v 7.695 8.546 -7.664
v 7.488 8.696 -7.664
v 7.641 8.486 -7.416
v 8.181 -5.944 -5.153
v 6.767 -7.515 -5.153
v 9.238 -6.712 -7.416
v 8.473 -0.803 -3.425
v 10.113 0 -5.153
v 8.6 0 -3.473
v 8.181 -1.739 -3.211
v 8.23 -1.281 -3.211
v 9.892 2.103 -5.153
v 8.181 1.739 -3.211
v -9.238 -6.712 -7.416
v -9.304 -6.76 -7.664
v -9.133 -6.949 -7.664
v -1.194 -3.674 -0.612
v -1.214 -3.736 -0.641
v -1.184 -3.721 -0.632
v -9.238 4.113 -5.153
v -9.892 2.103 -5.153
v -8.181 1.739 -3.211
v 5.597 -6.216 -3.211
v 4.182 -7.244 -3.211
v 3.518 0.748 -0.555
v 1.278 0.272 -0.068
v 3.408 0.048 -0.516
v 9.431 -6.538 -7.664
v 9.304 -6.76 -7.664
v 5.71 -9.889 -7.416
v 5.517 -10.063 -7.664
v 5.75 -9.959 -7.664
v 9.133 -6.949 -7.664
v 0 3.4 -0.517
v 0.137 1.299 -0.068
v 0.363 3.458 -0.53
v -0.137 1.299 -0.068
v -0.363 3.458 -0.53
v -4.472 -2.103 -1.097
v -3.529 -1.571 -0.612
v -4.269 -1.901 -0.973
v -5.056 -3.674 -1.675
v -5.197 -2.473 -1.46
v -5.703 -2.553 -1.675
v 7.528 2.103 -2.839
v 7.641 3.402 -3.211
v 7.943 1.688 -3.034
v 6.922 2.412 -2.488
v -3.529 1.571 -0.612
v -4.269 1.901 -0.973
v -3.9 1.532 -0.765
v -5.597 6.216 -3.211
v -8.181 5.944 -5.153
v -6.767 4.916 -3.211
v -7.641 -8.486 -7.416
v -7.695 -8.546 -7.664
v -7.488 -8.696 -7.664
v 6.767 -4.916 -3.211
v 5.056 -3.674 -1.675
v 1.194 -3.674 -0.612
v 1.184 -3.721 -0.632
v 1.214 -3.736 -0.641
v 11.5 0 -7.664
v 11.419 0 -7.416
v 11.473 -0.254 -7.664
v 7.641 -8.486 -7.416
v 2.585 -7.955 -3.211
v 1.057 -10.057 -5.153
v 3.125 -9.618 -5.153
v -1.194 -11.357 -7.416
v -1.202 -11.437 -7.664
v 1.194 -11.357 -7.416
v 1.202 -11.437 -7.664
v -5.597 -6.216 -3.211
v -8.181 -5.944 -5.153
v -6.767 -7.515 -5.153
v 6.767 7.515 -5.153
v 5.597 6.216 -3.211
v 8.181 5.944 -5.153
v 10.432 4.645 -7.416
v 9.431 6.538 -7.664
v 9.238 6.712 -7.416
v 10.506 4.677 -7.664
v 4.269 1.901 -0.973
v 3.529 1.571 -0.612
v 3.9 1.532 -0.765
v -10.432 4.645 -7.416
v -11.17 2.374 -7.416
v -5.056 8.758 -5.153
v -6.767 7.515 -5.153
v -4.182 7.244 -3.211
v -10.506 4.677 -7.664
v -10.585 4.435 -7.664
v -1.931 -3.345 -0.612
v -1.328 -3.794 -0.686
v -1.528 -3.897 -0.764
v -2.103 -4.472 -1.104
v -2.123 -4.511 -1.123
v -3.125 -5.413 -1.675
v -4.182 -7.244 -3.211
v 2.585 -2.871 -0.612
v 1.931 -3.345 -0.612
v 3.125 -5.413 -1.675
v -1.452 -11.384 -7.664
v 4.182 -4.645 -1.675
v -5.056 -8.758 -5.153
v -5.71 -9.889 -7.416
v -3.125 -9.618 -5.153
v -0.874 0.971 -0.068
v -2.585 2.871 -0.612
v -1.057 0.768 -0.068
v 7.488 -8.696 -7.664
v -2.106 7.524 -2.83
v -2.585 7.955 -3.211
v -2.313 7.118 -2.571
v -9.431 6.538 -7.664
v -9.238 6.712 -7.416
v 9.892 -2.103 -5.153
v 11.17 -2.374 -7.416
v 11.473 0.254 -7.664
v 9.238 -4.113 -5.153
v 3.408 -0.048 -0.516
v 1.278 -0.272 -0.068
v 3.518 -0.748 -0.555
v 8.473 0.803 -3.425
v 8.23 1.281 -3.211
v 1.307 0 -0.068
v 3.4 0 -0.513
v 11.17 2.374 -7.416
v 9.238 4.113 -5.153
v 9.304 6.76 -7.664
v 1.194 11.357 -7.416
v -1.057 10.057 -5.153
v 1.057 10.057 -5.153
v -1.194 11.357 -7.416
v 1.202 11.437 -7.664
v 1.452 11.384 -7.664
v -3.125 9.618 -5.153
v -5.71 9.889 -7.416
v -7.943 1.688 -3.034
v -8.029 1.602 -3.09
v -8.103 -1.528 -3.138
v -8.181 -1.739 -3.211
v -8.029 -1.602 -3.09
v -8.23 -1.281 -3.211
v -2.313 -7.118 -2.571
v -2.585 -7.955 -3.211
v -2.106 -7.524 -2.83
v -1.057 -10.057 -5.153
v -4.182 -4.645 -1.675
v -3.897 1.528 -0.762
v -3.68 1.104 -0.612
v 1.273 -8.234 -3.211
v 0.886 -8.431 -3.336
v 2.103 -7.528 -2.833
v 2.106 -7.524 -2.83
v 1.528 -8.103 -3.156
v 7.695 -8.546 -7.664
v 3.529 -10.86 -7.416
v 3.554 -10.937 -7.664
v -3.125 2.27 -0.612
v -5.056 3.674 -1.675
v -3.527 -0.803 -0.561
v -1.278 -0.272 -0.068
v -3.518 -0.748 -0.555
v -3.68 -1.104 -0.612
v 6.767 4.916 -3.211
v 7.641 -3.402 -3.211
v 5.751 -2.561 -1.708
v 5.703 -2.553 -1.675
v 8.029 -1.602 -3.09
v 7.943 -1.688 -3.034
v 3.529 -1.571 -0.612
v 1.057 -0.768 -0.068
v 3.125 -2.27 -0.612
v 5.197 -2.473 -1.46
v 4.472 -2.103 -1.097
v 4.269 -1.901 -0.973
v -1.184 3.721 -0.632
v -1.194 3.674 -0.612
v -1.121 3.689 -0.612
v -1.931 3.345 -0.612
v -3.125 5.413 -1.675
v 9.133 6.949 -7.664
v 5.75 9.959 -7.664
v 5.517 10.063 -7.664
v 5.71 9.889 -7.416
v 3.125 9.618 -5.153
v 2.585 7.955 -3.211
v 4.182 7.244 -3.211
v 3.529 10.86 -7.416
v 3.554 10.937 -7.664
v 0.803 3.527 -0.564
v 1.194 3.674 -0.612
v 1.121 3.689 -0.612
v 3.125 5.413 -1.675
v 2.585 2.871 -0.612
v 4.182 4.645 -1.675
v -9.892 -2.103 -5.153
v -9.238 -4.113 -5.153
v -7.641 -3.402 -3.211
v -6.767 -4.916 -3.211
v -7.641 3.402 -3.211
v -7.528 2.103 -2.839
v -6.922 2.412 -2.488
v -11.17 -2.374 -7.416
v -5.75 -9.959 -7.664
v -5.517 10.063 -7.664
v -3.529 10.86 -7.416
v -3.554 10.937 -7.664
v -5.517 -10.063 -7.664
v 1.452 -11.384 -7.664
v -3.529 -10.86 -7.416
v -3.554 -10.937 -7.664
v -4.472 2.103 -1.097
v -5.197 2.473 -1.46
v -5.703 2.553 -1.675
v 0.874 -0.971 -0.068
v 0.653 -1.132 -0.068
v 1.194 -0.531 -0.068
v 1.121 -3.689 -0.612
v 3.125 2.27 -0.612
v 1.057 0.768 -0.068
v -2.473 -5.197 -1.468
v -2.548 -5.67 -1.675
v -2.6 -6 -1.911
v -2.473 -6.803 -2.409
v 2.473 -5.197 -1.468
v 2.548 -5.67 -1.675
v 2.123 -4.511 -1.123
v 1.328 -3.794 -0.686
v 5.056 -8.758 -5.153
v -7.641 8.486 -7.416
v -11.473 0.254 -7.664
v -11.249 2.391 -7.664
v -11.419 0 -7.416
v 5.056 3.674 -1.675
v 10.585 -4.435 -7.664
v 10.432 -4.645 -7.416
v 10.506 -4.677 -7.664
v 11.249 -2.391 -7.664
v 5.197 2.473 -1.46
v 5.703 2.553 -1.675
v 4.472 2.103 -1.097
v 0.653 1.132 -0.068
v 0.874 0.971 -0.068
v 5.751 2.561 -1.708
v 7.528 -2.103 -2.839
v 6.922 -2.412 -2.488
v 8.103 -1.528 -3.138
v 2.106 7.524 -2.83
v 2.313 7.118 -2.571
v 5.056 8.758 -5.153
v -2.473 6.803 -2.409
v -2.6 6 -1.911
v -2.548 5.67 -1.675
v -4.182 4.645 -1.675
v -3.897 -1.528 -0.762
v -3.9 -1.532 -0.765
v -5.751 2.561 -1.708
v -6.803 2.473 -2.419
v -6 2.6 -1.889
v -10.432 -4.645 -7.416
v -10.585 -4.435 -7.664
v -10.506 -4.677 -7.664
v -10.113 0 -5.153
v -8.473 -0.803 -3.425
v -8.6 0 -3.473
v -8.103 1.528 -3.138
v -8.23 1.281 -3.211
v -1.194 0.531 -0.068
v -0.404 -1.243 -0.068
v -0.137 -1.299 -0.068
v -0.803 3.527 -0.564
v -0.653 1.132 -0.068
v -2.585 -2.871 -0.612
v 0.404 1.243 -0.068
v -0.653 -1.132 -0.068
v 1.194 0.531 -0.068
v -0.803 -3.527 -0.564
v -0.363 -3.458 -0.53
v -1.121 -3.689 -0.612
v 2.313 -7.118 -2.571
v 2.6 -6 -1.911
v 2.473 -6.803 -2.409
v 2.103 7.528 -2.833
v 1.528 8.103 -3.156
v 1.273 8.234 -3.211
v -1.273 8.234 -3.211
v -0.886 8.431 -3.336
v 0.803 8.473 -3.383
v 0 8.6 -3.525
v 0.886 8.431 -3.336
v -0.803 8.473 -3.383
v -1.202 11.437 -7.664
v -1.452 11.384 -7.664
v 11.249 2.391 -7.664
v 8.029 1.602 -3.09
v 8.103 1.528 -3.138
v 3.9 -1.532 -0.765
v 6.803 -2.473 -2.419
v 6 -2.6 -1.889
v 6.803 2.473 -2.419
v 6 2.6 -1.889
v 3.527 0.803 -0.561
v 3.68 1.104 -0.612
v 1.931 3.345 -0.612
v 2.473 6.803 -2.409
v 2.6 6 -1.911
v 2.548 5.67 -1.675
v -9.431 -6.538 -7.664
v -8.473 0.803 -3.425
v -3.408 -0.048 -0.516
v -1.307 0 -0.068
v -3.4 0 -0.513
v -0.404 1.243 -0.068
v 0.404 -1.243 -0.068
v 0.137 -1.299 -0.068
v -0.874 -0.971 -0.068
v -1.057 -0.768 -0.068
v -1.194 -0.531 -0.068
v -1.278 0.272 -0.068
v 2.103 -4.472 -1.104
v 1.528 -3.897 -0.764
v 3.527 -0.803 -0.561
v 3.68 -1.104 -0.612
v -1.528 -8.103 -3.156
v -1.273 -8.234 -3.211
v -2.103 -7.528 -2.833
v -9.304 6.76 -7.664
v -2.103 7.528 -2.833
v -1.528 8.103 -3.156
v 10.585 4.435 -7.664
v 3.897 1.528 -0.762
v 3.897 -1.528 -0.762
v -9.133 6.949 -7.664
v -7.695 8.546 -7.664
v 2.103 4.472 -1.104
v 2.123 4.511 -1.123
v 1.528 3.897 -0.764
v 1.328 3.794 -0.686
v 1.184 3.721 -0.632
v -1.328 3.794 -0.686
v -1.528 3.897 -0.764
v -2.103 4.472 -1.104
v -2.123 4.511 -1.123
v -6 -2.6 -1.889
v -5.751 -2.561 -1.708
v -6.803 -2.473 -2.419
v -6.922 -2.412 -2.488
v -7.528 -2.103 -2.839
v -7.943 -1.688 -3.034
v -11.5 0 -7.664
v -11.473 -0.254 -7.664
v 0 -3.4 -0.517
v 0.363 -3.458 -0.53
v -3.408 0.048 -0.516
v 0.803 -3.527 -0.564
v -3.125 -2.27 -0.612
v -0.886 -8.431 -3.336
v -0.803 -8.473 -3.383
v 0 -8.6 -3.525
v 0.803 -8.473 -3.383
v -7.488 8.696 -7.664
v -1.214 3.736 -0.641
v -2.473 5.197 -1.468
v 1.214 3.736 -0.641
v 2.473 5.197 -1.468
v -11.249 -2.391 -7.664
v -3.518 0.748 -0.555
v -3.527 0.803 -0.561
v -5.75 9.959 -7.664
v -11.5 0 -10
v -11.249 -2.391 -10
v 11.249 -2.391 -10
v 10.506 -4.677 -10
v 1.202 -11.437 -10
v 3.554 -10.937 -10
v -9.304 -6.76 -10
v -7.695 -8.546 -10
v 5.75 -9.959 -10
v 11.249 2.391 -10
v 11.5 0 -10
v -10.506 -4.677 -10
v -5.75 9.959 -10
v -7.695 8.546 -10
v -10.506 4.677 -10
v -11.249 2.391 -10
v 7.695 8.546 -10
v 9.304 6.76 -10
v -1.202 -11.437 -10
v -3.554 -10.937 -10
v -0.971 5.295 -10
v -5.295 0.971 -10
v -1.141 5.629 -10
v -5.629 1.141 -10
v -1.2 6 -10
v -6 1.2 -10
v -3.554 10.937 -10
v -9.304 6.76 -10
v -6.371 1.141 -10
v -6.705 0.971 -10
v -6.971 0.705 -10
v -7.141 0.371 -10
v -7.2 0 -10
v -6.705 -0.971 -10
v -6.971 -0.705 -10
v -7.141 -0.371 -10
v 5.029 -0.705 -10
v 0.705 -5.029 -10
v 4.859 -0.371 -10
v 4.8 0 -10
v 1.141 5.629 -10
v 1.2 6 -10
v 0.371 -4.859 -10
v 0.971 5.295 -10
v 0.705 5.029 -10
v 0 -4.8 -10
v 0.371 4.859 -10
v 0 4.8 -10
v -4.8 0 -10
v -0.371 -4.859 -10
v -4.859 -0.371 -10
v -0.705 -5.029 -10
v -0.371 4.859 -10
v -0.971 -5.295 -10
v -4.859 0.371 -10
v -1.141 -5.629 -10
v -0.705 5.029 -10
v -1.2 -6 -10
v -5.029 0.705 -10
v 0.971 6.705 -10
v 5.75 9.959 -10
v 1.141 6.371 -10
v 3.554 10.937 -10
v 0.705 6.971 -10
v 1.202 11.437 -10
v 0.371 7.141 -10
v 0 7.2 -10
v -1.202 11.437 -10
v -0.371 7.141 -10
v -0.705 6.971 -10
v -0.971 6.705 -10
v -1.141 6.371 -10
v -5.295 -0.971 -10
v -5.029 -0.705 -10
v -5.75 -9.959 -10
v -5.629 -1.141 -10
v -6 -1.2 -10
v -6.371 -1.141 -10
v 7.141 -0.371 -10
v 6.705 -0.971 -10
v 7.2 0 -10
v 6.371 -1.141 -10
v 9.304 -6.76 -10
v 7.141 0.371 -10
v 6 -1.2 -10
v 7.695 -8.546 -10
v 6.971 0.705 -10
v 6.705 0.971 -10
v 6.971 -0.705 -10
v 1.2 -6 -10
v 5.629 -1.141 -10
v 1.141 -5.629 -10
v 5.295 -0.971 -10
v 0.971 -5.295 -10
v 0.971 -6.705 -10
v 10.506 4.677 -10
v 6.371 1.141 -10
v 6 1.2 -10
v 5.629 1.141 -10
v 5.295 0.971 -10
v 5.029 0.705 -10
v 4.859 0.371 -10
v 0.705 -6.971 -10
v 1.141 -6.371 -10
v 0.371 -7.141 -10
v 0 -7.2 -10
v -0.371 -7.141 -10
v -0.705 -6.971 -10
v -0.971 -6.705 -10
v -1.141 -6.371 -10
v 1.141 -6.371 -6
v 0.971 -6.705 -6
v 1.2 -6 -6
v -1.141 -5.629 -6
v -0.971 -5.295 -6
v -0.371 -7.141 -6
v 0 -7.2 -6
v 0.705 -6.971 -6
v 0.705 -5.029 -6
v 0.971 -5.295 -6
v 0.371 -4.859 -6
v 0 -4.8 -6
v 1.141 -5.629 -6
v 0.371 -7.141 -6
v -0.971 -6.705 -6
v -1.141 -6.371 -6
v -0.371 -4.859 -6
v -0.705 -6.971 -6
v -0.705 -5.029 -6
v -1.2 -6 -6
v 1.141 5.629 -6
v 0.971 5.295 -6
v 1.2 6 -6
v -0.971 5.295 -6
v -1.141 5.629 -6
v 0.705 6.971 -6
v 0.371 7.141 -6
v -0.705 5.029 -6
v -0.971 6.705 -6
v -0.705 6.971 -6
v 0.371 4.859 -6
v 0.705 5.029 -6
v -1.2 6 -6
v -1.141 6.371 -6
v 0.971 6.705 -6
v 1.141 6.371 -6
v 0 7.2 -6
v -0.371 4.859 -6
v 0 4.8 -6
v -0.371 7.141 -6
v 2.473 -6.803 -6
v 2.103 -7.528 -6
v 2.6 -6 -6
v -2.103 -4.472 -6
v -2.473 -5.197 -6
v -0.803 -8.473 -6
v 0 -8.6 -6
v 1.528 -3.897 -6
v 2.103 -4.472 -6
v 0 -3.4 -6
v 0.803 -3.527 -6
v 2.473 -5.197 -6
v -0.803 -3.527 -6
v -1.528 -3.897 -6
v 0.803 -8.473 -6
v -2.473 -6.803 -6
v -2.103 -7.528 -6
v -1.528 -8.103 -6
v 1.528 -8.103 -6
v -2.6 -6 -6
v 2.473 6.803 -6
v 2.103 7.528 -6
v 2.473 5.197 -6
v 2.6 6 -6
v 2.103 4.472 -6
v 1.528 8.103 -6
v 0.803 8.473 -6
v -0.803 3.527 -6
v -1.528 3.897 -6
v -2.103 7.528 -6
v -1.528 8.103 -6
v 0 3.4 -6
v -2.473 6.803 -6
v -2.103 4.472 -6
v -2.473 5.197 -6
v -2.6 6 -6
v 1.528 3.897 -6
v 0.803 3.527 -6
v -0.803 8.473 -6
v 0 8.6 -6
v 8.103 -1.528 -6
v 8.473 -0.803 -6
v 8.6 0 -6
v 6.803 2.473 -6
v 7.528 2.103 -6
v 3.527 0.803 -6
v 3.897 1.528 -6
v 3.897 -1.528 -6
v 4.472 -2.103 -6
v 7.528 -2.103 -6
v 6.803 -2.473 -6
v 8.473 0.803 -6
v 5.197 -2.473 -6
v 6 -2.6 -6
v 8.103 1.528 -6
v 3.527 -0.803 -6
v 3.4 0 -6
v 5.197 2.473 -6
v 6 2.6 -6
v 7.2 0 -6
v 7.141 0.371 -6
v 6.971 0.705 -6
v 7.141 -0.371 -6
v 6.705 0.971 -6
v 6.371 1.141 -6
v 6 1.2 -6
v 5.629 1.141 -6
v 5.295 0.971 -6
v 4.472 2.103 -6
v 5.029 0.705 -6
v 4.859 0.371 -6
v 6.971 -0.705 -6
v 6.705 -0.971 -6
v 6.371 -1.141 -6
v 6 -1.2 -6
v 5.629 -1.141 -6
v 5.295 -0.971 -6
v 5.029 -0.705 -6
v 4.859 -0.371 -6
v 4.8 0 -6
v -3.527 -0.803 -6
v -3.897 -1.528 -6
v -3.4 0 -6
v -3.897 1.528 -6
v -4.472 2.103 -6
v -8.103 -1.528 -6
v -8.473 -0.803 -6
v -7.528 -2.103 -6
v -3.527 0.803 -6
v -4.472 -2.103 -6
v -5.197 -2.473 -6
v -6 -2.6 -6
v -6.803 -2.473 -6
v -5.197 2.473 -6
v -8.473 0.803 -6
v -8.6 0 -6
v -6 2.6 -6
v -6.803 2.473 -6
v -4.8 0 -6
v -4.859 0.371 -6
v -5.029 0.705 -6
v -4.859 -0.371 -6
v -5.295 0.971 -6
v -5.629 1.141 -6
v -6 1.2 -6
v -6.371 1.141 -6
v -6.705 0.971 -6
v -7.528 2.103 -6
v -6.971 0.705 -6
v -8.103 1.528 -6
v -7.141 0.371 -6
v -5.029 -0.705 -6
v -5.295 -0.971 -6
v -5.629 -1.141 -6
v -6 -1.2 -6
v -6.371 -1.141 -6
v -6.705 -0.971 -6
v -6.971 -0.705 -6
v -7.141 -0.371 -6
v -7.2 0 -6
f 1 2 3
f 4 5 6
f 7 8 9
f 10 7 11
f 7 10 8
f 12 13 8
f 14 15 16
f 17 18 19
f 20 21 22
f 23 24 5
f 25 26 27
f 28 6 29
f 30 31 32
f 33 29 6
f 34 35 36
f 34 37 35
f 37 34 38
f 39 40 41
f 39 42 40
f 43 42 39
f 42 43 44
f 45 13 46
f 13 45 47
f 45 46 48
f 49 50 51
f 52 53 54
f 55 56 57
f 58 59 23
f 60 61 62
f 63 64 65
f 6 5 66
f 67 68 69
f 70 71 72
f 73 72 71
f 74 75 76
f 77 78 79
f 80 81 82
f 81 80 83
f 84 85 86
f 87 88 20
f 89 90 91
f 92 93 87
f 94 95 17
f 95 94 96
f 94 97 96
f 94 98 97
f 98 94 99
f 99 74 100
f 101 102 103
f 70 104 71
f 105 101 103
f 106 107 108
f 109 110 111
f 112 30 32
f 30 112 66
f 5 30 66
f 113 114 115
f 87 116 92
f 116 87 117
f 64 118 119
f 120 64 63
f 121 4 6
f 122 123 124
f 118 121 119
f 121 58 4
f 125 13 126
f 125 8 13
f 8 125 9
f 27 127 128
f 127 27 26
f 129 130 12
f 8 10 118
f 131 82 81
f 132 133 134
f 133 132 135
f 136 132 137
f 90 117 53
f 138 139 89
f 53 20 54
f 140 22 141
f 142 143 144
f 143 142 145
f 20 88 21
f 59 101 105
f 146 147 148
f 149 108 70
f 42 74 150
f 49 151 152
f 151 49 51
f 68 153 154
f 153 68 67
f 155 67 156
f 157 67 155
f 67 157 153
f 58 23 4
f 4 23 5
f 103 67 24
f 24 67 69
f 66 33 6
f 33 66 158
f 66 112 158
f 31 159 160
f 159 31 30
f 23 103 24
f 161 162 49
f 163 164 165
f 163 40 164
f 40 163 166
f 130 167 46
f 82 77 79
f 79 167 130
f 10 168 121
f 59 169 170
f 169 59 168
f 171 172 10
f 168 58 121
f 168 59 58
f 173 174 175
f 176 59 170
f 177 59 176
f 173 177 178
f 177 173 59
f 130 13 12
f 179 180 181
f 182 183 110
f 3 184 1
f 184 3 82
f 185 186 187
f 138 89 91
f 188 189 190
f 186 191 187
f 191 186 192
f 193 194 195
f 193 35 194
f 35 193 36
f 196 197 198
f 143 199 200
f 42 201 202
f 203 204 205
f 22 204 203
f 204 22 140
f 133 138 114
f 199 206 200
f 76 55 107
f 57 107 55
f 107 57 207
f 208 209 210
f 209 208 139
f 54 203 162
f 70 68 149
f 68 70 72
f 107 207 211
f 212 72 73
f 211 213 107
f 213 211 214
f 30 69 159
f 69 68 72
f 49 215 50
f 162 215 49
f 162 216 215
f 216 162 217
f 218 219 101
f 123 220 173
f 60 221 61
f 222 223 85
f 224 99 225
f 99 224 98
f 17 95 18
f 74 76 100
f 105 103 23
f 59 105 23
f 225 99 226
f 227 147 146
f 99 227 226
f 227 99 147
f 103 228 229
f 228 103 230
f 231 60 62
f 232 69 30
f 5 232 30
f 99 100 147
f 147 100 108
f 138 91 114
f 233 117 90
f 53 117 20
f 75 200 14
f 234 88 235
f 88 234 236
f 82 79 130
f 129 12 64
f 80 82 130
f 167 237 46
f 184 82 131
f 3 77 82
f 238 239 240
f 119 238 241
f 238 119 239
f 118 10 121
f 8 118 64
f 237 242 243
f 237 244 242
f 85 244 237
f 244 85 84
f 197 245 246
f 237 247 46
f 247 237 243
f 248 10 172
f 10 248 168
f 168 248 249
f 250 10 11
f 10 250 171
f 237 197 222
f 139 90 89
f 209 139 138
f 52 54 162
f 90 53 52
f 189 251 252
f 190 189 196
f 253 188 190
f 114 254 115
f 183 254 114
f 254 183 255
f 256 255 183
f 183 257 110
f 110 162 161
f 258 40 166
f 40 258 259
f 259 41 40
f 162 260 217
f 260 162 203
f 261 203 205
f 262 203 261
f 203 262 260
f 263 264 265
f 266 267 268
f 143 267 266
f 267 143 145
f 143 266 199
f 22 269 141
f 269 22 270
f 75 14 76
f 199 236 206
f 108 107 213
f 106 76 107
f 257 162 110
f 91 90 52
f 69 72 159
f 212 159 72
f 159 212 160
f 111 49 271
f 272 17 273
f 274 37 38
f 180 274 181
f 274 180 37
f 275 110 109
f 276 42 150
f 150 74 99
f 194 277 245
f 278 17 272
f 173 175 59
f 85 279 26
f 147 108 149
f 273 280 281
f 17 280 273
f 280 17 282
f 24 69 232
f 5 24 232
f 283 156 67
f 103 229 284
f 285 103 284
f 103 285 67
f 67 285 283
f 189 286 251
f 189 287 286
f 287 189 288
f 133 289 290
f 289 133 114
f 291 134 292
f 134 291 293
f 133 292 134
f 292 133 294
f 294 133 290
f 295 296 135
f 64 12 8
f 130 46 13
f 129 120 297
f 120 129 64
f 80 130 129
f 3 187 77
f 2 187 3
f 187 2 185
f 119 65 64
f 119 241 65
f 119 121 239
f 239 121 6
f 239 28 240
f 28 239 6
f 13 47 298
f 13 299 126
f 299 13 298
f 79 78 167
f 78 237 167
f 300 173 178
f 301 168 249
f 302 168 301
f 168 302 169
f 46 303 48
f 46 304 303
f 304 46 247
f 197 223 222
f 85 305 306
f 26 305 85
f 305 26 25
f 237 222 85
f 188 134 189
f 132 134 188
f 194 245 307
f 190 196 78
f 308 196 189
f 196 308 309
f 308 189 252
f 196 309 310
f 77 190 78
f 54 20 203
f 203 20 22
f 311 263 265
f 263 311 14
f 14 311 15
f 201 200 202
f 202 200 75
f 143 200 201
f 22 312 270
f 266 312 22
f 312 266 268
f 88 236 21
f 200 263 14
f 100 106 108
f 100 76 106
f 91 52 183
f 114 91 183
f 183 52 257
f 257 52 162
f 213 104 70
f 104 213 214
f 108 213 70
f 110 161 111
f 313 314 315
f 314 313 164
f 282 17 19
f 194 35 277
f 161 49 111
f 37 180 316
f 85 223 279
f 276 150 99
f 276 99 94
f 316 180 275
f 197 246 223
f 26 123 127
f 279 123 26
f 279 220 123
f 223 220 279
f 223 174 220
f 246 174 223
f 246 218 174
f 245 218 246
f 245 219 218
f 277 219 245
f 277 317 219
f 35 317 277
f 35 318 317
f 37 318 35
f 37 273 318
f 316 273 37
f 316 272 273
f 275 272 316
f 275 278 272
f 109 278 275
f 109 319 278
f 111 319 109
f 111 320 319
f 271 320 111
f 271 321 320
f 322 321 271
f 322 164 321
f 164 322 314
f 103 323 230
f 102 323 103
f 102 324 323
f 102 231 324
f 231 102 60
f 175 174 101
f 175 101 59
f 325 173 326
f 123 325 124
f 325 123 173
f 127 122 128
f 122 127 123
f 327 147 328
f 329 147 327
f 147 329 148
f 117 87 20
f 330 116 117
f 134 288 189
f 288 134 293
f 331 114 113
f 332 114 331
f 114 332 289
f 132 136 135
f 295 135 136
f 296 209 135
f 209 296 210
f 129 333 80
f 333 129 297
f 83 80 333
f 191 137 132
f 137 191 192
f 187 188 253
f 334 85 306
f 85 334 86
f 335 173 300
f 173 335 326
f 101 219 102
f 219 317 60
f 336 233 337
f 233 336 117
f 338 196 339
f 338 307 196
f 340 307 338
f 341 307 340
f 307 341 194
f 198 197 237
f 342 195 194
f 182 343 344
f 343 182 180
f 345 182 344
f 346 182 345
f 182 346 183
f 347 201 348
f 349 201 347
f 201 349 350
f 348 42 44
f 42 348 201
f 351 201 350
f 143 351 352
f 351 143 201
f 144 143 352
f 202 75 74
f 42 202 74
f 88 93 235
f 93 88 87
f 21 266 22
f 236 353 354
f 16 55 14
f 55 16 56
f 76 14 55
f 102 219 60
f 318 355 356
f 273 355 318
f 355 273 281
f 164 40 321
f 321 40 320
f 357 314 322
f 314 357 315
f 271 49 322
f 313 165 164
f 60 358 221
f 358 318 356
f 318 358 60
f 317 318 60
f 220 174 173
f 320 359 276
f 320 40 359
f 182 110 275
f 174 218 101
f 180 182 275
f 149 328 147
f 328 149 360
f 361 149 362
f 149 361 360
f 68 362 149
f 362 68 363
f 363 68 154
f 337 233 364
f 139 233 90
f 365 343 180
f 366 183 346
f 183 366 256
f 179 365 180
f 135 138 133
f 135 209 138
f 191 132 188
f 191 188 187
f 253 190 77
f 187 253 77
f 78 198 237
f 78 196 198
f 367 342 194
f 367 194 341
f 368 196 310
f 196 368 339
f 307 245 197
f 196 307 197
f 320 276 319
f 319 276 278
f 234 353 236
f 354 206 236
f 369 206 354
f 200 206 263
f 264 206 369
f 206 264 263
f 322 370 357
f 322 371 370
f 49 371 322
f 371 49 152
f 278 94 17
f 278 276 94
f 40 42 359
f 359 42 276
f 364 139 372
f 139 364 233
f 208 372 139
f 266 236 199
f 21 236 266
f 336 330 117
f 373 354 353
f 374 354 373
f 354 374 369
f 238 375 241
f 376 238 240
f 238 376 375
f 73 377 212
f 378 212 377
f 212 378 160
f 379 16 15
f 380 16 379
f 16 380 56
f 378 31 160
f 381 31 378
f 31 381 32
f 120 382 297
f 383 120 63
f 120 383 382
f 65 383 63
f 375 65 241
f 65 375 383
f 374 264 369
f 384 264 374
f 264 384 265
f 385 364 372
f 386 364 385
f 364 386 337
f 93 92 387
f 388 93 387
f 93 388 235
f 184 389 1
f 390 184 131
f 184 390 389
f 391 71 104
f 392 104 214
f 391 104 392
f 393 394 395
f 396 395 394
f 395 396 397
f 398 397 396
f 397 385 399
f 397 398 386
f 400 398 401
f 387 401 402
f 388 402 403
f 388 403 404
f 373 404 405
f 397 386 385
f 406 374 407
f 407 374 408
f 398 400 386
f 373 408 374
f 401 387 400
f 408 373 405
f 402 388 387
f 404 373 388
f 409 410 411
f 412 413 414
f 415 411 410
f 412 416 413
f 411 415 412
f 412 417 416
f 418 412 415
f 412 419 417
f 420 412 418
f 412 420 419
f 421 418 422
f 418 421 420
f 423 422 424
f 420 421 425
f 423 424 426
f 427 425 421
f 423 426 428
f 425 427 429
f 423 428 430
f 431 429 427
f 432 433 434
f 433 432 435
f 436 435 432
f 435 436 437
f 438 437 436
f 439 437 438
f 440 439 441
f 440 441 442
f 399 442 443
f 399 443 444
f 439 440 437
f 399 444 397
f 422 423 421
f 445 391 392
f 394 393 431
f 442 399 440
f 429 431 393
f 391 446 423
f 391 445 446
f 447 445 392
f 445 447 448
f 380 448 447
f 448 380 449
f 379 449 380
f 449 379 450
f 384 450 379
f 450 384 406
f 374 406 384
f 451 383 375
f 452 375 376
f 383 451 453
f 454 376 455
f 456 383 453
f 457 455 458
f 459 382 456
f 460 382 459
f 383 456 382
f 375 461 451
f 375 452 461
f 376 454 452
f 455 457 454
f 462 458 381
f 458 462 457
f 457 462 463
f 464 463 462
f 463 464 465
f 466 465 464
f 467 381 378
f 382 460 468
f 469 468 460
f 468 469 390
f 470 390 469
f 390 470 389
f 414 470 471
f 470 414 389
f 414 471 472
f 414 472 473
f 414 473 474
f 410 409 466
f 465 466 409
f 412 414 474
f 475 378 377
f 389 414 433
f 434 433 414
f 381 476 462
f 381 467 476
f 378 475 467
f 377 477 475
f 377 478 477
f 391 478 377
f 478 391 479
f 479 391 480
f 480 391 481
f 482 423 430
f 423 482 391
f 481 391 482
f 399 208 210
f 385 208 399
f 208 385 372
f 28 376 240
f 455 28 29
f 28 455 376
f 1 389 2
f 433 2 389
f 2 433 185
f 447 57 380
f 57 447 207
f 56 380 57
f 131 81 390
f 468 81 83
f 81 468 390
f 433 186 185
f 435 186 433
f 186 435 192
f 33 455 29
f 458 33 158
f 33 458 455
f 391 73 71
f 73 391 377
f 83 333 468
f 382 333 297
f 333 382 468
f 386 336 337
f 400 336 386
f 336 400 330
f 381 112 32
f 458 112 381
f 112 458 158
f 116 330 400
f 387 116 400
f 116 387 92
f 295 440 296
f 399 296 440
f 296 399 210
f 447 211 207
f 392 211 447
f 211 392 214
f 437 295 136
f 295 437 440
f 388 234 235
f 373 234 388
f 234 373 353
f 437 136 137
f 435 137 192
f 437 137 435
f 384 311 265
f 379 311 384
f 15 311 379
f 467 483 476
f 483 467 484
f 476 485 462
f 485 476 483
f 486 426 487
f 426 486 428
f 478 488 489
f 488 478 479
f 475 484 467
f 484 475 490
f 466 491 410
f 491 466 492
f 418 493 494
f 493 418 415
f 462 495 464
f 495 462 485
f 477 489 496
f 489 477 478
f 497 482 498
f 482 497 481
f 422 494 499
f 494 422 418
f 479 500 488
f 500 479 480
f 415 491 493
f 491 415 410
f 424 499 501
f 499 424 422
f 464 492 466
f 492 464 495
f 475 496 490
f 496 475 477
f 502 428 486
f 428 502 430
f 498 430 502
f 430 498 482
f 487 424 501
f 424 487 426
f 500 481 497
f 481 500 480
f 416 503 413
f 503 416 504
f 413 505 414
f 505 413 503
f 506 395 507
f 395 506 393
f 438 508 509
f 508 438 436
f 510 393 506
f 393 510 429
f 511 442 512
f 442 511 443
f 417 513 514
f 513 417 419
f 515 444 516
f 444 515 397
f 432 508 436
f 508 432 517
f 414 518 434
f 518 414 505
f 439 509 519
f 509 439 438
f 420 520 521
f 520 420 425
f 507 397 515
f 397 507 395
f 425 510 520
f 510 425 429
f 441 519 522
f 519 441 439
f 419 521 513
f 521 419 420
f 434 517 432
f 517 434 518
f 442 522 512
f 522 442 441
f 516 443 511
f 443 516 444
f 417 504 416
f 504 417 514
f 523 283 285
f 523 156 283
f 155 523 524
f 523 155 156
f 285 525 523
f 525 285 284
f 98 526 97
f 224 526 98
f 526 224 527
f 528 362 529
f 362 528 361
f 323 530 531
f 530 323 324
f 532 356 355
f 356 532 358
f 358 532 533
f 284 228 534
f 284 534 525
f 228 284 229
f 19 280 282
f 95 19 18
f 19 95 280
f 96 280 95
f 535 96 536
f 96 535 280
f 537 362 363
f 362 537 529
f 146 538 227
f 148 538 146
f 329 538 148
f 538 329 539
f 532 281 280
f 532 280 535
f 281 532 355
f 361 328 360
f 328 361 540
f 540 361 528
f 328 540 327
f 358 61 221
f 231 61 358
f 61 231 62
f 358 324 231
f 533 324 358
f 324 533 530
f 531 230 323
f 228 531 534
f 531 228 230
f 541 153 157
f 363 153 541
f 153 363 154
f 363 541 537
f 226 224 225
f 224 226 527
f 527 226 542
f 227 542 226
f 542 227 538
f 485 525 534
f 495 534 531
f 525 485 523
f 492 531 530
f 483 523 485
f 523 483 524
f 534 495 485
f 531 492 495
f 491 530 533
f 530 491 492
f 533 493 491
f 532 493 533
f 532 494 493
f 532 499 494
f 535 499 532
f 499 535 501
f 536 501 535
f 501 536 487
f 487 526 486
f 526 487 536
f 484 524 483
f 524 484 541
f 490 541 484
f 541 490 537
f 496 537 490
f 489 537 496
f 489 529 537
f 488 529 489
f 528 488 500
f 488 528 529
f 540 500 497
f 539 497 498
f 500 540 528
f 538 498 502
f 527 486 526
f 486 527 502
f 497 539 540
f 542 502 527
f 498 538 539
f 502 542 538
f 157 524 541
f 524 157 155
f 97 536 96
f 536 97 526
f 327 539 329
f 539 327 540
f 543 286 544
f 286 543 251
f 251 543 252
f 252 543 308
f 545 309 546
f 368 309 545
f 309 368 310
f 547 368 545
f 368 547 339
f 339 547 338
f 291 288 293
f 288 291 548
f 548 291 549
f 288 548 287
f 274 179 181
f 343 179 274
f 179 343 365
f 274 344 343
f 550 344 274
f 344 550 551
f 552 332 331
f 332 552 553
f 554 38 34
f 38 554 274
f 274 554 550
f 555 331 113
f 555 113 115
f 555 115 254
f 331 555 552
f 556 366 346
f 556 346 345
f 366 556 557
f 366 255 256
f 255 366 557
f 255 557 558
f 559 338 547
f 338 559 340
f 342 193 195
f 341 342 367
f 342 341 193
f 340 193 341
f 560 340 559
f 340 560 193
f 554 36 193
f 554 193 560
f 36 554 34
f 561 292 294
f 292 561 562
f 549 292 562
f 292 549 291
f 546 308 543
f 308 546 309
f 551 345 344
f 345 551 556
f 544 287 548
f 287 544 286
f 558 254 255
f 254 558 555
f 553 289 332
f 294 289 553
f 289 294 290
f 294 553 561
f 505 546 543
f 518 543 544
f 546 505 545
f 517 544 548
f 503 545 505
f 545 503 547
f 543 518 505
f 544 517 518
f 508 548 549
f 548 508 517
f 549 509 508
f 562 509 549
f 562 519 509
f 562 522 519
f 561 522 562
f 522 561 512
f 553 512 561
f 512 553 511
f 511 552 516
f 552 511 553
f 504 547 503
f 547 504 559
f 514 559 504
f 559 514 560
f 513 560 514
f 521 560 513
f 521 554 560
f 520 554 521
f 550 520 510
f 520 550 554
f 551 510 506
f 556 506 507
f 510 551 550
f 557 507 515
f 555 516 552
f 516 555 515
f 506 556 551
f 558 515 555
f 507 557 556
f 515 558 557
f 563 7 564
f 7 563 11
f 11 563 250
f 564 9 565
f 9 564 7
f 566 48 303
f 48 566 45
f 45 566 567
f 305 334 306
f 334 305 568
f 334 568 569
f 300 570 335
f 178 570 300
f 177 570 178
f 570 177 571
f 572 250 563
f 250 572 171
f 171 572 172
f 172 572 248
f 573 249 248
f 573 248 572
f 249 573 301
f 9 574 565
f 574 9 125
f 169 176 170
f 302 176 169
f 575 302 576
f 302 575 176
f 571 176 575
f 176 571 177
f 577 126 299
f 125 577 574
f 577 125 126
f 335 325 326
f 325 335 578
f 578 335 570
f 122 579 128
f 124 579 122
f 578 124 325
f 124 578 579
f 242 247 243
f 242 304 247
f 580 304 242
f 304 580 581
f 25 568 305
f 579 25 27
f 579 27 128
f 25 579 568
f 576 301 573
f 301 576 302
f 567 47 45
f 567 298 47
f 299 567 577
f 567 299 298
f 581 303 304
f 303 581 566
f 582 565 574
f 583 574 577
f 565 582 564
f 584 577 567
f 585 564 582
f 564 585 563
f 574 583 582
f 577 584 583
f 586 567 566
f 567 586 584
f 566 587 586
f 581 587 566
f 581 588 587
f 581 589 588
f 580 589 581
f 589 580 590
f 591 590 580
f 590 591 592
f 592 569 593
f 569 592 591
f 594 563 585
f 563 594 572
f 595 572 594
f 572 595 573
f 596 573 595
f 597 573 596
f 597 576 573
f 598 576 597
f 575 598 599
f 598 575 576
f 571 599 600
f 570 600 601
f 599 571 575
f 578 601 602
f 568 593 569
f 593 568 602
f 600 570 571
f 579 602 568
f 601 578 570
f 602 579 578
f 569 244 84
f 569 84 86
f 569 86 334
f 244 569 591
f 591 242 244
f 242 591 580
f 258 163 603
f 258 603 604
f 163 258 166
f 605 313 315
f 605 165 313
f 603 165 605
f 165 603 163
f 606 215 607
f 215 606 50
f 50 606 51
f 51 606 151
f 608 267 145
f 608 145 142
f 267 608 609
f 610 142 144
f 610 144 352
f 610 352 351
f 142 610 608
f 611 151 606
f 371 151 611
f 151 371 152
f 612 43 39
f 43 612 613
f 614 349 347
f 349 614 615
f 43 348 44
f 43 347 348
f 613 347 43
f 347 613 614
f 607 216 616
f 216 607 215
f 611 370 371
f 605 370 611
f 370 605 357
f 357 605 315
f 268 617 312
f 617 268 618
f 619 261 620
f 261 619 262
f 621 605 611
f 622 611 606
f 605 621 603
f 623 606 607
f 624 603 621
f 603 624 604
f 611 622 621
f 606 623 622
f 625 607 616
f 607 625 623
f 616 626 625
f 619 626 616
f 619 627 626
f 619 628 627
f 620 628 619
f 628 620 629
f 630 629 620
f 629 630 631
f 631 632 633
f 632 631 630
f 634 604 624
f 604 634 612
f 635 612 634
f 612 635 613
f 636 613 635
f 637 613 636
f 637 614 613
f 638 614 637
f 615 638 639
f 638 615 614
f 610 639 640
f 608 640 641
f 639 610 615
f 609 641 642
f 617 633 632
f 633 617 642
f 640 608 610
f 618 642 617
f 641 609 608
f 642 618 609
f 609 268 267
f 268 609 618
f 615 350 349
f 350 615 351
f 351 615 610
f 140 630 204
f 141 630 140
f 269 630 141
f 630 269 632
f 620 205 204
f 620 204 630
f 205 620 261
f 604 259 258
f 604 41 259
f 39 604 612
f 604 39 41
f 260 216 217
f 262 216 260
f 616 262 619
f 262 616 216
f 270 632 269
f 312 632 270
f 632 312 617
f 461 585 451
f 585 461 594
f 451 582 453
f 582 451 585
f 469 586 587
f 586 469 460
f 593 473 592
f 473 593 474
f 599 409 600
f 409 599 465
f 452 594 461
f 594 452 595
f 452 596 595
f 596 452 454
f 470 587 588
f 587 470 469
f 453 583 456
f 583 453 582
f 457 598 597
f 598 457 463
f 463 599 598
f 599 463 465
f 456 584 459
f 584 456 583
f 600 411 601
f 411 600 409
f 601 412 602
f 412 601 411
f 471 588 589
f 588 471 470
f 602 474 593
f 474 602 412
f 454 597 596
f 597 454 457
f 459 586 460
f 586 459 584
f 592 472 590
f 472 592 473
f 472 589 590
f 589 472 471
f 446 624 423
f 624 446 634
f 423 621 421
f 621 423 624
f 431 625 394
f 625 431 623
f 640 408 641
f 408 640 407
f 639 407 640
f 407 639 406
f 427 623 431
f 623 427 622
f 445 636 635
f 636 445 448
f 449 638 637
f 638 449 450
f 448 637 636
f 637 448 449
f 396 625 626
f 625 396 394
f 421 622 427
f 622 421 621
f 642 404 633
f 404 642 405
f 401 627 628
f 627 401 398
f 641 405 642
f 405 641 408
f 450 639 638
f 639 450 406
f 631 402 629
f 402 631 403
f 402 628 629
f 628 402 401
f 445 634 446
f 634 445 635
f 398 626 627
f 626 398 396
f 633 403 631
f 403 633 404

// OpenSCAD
// Diameter of skid (same as motor works well)
diameter        = 23;

// Height of skid, wanna stand tall?
height          = 10;

// Diameter of the sphere used for curved bottom of skid
curvature       = 25;

// First motor mounting hole spacing (used for two-hole and four-hole mounting)
spacing1        = 12;

// Second motor mounting hole spacing (used for four-hole mounting)
spacing2        = 12;

// Motor mounting screw size, adjusted for clearance
holesize        = 2; // [2:M2, 3:M3]

// Thickness of base (increases motor screw lengths)
thickness       = 4; // [1:1MM, 2:2MM, 3:3MM, 4:4MM, 5:5MM, 6:6MM]

// Rounded is heavier and stonger and cross is lighter.
style           = 1; // [1:Rounded, 2:Cross]

// Number of mounting holes.
count           = 4; // [2:Two, 4:Four]

holesize_r      = holesize/2;
curvature_r     = curvature/2;
diameter_r      = diameter/2;

// Rotate it for correct printing orientation.
rotate([180, 0, 0]) {
    difference() {
        // Skid body
        intersection() {
            translate([0, 0, curvature_r]) sphere(r=curvature_r);
            cylinder(r=diameter_r, h=height);
        }

        // Mounting holes
        // Screw shafts
        translate([spacing1/2, 0, 0]) cylinder(r=holesize_r*1.2, h=height, $fn=20);
        translate([0-spacing1/2, 0, 0]) cylinder(r=holesize_r*1.2, h=height, $fn=20);
        if (count==4) {
            translate([0, spacing2/2, 0]) cylinder(r=holesize_r*1.2, h=height, $fn=20);
            translate([0, 0-spacing2/2, 0]) cylinder(r=holesize_r*1.2, h=height, $fn=20);
        }

        if (style==1) {
            // Style: Rounded
            // Screw head insets
            translate([spacing1/2, 0, 0]) cylinder(r=holesize_r+1.6, h=height-thickness, $fn=20);
            translate([0-spacing1/2, 0, 0]) cylinder(r=holesize_r+1.6, h=height-thickness, $fn=20);
            if (count==4) {
                translate([0, spacing2/2, 0]) cylinder(r=holesize_r+1.6, h=height-thickness, $fn=20);
                translate([0, 0-spacing2/2, 0]) cylinder(r=holesize_r+1.6, h=height-thickness, $fn=20);
            }
        } else {
            // Style: Cross
            // Trianglular cutouts
            rotate([0, 0, 45]) translate([1.5, 1.5, 0-thickness]) cube([diameter_r, diameter_r, height]);
            rotate([0, 0, -45]) translate([1.5, 1.5, 0-thickness]) cube([diameter_r, diameter_r, height]);
            rotate([0, 0, 135]) translate([1.5, 1.5, 0-thickness]) cube([diameter_r, diameter_r, height]);
            rotate([0, 0, 225]) translate([1.5, 1.5, 0-thickness]) cube([diameter_r, diameter_r, height]);
        }
    }
}
